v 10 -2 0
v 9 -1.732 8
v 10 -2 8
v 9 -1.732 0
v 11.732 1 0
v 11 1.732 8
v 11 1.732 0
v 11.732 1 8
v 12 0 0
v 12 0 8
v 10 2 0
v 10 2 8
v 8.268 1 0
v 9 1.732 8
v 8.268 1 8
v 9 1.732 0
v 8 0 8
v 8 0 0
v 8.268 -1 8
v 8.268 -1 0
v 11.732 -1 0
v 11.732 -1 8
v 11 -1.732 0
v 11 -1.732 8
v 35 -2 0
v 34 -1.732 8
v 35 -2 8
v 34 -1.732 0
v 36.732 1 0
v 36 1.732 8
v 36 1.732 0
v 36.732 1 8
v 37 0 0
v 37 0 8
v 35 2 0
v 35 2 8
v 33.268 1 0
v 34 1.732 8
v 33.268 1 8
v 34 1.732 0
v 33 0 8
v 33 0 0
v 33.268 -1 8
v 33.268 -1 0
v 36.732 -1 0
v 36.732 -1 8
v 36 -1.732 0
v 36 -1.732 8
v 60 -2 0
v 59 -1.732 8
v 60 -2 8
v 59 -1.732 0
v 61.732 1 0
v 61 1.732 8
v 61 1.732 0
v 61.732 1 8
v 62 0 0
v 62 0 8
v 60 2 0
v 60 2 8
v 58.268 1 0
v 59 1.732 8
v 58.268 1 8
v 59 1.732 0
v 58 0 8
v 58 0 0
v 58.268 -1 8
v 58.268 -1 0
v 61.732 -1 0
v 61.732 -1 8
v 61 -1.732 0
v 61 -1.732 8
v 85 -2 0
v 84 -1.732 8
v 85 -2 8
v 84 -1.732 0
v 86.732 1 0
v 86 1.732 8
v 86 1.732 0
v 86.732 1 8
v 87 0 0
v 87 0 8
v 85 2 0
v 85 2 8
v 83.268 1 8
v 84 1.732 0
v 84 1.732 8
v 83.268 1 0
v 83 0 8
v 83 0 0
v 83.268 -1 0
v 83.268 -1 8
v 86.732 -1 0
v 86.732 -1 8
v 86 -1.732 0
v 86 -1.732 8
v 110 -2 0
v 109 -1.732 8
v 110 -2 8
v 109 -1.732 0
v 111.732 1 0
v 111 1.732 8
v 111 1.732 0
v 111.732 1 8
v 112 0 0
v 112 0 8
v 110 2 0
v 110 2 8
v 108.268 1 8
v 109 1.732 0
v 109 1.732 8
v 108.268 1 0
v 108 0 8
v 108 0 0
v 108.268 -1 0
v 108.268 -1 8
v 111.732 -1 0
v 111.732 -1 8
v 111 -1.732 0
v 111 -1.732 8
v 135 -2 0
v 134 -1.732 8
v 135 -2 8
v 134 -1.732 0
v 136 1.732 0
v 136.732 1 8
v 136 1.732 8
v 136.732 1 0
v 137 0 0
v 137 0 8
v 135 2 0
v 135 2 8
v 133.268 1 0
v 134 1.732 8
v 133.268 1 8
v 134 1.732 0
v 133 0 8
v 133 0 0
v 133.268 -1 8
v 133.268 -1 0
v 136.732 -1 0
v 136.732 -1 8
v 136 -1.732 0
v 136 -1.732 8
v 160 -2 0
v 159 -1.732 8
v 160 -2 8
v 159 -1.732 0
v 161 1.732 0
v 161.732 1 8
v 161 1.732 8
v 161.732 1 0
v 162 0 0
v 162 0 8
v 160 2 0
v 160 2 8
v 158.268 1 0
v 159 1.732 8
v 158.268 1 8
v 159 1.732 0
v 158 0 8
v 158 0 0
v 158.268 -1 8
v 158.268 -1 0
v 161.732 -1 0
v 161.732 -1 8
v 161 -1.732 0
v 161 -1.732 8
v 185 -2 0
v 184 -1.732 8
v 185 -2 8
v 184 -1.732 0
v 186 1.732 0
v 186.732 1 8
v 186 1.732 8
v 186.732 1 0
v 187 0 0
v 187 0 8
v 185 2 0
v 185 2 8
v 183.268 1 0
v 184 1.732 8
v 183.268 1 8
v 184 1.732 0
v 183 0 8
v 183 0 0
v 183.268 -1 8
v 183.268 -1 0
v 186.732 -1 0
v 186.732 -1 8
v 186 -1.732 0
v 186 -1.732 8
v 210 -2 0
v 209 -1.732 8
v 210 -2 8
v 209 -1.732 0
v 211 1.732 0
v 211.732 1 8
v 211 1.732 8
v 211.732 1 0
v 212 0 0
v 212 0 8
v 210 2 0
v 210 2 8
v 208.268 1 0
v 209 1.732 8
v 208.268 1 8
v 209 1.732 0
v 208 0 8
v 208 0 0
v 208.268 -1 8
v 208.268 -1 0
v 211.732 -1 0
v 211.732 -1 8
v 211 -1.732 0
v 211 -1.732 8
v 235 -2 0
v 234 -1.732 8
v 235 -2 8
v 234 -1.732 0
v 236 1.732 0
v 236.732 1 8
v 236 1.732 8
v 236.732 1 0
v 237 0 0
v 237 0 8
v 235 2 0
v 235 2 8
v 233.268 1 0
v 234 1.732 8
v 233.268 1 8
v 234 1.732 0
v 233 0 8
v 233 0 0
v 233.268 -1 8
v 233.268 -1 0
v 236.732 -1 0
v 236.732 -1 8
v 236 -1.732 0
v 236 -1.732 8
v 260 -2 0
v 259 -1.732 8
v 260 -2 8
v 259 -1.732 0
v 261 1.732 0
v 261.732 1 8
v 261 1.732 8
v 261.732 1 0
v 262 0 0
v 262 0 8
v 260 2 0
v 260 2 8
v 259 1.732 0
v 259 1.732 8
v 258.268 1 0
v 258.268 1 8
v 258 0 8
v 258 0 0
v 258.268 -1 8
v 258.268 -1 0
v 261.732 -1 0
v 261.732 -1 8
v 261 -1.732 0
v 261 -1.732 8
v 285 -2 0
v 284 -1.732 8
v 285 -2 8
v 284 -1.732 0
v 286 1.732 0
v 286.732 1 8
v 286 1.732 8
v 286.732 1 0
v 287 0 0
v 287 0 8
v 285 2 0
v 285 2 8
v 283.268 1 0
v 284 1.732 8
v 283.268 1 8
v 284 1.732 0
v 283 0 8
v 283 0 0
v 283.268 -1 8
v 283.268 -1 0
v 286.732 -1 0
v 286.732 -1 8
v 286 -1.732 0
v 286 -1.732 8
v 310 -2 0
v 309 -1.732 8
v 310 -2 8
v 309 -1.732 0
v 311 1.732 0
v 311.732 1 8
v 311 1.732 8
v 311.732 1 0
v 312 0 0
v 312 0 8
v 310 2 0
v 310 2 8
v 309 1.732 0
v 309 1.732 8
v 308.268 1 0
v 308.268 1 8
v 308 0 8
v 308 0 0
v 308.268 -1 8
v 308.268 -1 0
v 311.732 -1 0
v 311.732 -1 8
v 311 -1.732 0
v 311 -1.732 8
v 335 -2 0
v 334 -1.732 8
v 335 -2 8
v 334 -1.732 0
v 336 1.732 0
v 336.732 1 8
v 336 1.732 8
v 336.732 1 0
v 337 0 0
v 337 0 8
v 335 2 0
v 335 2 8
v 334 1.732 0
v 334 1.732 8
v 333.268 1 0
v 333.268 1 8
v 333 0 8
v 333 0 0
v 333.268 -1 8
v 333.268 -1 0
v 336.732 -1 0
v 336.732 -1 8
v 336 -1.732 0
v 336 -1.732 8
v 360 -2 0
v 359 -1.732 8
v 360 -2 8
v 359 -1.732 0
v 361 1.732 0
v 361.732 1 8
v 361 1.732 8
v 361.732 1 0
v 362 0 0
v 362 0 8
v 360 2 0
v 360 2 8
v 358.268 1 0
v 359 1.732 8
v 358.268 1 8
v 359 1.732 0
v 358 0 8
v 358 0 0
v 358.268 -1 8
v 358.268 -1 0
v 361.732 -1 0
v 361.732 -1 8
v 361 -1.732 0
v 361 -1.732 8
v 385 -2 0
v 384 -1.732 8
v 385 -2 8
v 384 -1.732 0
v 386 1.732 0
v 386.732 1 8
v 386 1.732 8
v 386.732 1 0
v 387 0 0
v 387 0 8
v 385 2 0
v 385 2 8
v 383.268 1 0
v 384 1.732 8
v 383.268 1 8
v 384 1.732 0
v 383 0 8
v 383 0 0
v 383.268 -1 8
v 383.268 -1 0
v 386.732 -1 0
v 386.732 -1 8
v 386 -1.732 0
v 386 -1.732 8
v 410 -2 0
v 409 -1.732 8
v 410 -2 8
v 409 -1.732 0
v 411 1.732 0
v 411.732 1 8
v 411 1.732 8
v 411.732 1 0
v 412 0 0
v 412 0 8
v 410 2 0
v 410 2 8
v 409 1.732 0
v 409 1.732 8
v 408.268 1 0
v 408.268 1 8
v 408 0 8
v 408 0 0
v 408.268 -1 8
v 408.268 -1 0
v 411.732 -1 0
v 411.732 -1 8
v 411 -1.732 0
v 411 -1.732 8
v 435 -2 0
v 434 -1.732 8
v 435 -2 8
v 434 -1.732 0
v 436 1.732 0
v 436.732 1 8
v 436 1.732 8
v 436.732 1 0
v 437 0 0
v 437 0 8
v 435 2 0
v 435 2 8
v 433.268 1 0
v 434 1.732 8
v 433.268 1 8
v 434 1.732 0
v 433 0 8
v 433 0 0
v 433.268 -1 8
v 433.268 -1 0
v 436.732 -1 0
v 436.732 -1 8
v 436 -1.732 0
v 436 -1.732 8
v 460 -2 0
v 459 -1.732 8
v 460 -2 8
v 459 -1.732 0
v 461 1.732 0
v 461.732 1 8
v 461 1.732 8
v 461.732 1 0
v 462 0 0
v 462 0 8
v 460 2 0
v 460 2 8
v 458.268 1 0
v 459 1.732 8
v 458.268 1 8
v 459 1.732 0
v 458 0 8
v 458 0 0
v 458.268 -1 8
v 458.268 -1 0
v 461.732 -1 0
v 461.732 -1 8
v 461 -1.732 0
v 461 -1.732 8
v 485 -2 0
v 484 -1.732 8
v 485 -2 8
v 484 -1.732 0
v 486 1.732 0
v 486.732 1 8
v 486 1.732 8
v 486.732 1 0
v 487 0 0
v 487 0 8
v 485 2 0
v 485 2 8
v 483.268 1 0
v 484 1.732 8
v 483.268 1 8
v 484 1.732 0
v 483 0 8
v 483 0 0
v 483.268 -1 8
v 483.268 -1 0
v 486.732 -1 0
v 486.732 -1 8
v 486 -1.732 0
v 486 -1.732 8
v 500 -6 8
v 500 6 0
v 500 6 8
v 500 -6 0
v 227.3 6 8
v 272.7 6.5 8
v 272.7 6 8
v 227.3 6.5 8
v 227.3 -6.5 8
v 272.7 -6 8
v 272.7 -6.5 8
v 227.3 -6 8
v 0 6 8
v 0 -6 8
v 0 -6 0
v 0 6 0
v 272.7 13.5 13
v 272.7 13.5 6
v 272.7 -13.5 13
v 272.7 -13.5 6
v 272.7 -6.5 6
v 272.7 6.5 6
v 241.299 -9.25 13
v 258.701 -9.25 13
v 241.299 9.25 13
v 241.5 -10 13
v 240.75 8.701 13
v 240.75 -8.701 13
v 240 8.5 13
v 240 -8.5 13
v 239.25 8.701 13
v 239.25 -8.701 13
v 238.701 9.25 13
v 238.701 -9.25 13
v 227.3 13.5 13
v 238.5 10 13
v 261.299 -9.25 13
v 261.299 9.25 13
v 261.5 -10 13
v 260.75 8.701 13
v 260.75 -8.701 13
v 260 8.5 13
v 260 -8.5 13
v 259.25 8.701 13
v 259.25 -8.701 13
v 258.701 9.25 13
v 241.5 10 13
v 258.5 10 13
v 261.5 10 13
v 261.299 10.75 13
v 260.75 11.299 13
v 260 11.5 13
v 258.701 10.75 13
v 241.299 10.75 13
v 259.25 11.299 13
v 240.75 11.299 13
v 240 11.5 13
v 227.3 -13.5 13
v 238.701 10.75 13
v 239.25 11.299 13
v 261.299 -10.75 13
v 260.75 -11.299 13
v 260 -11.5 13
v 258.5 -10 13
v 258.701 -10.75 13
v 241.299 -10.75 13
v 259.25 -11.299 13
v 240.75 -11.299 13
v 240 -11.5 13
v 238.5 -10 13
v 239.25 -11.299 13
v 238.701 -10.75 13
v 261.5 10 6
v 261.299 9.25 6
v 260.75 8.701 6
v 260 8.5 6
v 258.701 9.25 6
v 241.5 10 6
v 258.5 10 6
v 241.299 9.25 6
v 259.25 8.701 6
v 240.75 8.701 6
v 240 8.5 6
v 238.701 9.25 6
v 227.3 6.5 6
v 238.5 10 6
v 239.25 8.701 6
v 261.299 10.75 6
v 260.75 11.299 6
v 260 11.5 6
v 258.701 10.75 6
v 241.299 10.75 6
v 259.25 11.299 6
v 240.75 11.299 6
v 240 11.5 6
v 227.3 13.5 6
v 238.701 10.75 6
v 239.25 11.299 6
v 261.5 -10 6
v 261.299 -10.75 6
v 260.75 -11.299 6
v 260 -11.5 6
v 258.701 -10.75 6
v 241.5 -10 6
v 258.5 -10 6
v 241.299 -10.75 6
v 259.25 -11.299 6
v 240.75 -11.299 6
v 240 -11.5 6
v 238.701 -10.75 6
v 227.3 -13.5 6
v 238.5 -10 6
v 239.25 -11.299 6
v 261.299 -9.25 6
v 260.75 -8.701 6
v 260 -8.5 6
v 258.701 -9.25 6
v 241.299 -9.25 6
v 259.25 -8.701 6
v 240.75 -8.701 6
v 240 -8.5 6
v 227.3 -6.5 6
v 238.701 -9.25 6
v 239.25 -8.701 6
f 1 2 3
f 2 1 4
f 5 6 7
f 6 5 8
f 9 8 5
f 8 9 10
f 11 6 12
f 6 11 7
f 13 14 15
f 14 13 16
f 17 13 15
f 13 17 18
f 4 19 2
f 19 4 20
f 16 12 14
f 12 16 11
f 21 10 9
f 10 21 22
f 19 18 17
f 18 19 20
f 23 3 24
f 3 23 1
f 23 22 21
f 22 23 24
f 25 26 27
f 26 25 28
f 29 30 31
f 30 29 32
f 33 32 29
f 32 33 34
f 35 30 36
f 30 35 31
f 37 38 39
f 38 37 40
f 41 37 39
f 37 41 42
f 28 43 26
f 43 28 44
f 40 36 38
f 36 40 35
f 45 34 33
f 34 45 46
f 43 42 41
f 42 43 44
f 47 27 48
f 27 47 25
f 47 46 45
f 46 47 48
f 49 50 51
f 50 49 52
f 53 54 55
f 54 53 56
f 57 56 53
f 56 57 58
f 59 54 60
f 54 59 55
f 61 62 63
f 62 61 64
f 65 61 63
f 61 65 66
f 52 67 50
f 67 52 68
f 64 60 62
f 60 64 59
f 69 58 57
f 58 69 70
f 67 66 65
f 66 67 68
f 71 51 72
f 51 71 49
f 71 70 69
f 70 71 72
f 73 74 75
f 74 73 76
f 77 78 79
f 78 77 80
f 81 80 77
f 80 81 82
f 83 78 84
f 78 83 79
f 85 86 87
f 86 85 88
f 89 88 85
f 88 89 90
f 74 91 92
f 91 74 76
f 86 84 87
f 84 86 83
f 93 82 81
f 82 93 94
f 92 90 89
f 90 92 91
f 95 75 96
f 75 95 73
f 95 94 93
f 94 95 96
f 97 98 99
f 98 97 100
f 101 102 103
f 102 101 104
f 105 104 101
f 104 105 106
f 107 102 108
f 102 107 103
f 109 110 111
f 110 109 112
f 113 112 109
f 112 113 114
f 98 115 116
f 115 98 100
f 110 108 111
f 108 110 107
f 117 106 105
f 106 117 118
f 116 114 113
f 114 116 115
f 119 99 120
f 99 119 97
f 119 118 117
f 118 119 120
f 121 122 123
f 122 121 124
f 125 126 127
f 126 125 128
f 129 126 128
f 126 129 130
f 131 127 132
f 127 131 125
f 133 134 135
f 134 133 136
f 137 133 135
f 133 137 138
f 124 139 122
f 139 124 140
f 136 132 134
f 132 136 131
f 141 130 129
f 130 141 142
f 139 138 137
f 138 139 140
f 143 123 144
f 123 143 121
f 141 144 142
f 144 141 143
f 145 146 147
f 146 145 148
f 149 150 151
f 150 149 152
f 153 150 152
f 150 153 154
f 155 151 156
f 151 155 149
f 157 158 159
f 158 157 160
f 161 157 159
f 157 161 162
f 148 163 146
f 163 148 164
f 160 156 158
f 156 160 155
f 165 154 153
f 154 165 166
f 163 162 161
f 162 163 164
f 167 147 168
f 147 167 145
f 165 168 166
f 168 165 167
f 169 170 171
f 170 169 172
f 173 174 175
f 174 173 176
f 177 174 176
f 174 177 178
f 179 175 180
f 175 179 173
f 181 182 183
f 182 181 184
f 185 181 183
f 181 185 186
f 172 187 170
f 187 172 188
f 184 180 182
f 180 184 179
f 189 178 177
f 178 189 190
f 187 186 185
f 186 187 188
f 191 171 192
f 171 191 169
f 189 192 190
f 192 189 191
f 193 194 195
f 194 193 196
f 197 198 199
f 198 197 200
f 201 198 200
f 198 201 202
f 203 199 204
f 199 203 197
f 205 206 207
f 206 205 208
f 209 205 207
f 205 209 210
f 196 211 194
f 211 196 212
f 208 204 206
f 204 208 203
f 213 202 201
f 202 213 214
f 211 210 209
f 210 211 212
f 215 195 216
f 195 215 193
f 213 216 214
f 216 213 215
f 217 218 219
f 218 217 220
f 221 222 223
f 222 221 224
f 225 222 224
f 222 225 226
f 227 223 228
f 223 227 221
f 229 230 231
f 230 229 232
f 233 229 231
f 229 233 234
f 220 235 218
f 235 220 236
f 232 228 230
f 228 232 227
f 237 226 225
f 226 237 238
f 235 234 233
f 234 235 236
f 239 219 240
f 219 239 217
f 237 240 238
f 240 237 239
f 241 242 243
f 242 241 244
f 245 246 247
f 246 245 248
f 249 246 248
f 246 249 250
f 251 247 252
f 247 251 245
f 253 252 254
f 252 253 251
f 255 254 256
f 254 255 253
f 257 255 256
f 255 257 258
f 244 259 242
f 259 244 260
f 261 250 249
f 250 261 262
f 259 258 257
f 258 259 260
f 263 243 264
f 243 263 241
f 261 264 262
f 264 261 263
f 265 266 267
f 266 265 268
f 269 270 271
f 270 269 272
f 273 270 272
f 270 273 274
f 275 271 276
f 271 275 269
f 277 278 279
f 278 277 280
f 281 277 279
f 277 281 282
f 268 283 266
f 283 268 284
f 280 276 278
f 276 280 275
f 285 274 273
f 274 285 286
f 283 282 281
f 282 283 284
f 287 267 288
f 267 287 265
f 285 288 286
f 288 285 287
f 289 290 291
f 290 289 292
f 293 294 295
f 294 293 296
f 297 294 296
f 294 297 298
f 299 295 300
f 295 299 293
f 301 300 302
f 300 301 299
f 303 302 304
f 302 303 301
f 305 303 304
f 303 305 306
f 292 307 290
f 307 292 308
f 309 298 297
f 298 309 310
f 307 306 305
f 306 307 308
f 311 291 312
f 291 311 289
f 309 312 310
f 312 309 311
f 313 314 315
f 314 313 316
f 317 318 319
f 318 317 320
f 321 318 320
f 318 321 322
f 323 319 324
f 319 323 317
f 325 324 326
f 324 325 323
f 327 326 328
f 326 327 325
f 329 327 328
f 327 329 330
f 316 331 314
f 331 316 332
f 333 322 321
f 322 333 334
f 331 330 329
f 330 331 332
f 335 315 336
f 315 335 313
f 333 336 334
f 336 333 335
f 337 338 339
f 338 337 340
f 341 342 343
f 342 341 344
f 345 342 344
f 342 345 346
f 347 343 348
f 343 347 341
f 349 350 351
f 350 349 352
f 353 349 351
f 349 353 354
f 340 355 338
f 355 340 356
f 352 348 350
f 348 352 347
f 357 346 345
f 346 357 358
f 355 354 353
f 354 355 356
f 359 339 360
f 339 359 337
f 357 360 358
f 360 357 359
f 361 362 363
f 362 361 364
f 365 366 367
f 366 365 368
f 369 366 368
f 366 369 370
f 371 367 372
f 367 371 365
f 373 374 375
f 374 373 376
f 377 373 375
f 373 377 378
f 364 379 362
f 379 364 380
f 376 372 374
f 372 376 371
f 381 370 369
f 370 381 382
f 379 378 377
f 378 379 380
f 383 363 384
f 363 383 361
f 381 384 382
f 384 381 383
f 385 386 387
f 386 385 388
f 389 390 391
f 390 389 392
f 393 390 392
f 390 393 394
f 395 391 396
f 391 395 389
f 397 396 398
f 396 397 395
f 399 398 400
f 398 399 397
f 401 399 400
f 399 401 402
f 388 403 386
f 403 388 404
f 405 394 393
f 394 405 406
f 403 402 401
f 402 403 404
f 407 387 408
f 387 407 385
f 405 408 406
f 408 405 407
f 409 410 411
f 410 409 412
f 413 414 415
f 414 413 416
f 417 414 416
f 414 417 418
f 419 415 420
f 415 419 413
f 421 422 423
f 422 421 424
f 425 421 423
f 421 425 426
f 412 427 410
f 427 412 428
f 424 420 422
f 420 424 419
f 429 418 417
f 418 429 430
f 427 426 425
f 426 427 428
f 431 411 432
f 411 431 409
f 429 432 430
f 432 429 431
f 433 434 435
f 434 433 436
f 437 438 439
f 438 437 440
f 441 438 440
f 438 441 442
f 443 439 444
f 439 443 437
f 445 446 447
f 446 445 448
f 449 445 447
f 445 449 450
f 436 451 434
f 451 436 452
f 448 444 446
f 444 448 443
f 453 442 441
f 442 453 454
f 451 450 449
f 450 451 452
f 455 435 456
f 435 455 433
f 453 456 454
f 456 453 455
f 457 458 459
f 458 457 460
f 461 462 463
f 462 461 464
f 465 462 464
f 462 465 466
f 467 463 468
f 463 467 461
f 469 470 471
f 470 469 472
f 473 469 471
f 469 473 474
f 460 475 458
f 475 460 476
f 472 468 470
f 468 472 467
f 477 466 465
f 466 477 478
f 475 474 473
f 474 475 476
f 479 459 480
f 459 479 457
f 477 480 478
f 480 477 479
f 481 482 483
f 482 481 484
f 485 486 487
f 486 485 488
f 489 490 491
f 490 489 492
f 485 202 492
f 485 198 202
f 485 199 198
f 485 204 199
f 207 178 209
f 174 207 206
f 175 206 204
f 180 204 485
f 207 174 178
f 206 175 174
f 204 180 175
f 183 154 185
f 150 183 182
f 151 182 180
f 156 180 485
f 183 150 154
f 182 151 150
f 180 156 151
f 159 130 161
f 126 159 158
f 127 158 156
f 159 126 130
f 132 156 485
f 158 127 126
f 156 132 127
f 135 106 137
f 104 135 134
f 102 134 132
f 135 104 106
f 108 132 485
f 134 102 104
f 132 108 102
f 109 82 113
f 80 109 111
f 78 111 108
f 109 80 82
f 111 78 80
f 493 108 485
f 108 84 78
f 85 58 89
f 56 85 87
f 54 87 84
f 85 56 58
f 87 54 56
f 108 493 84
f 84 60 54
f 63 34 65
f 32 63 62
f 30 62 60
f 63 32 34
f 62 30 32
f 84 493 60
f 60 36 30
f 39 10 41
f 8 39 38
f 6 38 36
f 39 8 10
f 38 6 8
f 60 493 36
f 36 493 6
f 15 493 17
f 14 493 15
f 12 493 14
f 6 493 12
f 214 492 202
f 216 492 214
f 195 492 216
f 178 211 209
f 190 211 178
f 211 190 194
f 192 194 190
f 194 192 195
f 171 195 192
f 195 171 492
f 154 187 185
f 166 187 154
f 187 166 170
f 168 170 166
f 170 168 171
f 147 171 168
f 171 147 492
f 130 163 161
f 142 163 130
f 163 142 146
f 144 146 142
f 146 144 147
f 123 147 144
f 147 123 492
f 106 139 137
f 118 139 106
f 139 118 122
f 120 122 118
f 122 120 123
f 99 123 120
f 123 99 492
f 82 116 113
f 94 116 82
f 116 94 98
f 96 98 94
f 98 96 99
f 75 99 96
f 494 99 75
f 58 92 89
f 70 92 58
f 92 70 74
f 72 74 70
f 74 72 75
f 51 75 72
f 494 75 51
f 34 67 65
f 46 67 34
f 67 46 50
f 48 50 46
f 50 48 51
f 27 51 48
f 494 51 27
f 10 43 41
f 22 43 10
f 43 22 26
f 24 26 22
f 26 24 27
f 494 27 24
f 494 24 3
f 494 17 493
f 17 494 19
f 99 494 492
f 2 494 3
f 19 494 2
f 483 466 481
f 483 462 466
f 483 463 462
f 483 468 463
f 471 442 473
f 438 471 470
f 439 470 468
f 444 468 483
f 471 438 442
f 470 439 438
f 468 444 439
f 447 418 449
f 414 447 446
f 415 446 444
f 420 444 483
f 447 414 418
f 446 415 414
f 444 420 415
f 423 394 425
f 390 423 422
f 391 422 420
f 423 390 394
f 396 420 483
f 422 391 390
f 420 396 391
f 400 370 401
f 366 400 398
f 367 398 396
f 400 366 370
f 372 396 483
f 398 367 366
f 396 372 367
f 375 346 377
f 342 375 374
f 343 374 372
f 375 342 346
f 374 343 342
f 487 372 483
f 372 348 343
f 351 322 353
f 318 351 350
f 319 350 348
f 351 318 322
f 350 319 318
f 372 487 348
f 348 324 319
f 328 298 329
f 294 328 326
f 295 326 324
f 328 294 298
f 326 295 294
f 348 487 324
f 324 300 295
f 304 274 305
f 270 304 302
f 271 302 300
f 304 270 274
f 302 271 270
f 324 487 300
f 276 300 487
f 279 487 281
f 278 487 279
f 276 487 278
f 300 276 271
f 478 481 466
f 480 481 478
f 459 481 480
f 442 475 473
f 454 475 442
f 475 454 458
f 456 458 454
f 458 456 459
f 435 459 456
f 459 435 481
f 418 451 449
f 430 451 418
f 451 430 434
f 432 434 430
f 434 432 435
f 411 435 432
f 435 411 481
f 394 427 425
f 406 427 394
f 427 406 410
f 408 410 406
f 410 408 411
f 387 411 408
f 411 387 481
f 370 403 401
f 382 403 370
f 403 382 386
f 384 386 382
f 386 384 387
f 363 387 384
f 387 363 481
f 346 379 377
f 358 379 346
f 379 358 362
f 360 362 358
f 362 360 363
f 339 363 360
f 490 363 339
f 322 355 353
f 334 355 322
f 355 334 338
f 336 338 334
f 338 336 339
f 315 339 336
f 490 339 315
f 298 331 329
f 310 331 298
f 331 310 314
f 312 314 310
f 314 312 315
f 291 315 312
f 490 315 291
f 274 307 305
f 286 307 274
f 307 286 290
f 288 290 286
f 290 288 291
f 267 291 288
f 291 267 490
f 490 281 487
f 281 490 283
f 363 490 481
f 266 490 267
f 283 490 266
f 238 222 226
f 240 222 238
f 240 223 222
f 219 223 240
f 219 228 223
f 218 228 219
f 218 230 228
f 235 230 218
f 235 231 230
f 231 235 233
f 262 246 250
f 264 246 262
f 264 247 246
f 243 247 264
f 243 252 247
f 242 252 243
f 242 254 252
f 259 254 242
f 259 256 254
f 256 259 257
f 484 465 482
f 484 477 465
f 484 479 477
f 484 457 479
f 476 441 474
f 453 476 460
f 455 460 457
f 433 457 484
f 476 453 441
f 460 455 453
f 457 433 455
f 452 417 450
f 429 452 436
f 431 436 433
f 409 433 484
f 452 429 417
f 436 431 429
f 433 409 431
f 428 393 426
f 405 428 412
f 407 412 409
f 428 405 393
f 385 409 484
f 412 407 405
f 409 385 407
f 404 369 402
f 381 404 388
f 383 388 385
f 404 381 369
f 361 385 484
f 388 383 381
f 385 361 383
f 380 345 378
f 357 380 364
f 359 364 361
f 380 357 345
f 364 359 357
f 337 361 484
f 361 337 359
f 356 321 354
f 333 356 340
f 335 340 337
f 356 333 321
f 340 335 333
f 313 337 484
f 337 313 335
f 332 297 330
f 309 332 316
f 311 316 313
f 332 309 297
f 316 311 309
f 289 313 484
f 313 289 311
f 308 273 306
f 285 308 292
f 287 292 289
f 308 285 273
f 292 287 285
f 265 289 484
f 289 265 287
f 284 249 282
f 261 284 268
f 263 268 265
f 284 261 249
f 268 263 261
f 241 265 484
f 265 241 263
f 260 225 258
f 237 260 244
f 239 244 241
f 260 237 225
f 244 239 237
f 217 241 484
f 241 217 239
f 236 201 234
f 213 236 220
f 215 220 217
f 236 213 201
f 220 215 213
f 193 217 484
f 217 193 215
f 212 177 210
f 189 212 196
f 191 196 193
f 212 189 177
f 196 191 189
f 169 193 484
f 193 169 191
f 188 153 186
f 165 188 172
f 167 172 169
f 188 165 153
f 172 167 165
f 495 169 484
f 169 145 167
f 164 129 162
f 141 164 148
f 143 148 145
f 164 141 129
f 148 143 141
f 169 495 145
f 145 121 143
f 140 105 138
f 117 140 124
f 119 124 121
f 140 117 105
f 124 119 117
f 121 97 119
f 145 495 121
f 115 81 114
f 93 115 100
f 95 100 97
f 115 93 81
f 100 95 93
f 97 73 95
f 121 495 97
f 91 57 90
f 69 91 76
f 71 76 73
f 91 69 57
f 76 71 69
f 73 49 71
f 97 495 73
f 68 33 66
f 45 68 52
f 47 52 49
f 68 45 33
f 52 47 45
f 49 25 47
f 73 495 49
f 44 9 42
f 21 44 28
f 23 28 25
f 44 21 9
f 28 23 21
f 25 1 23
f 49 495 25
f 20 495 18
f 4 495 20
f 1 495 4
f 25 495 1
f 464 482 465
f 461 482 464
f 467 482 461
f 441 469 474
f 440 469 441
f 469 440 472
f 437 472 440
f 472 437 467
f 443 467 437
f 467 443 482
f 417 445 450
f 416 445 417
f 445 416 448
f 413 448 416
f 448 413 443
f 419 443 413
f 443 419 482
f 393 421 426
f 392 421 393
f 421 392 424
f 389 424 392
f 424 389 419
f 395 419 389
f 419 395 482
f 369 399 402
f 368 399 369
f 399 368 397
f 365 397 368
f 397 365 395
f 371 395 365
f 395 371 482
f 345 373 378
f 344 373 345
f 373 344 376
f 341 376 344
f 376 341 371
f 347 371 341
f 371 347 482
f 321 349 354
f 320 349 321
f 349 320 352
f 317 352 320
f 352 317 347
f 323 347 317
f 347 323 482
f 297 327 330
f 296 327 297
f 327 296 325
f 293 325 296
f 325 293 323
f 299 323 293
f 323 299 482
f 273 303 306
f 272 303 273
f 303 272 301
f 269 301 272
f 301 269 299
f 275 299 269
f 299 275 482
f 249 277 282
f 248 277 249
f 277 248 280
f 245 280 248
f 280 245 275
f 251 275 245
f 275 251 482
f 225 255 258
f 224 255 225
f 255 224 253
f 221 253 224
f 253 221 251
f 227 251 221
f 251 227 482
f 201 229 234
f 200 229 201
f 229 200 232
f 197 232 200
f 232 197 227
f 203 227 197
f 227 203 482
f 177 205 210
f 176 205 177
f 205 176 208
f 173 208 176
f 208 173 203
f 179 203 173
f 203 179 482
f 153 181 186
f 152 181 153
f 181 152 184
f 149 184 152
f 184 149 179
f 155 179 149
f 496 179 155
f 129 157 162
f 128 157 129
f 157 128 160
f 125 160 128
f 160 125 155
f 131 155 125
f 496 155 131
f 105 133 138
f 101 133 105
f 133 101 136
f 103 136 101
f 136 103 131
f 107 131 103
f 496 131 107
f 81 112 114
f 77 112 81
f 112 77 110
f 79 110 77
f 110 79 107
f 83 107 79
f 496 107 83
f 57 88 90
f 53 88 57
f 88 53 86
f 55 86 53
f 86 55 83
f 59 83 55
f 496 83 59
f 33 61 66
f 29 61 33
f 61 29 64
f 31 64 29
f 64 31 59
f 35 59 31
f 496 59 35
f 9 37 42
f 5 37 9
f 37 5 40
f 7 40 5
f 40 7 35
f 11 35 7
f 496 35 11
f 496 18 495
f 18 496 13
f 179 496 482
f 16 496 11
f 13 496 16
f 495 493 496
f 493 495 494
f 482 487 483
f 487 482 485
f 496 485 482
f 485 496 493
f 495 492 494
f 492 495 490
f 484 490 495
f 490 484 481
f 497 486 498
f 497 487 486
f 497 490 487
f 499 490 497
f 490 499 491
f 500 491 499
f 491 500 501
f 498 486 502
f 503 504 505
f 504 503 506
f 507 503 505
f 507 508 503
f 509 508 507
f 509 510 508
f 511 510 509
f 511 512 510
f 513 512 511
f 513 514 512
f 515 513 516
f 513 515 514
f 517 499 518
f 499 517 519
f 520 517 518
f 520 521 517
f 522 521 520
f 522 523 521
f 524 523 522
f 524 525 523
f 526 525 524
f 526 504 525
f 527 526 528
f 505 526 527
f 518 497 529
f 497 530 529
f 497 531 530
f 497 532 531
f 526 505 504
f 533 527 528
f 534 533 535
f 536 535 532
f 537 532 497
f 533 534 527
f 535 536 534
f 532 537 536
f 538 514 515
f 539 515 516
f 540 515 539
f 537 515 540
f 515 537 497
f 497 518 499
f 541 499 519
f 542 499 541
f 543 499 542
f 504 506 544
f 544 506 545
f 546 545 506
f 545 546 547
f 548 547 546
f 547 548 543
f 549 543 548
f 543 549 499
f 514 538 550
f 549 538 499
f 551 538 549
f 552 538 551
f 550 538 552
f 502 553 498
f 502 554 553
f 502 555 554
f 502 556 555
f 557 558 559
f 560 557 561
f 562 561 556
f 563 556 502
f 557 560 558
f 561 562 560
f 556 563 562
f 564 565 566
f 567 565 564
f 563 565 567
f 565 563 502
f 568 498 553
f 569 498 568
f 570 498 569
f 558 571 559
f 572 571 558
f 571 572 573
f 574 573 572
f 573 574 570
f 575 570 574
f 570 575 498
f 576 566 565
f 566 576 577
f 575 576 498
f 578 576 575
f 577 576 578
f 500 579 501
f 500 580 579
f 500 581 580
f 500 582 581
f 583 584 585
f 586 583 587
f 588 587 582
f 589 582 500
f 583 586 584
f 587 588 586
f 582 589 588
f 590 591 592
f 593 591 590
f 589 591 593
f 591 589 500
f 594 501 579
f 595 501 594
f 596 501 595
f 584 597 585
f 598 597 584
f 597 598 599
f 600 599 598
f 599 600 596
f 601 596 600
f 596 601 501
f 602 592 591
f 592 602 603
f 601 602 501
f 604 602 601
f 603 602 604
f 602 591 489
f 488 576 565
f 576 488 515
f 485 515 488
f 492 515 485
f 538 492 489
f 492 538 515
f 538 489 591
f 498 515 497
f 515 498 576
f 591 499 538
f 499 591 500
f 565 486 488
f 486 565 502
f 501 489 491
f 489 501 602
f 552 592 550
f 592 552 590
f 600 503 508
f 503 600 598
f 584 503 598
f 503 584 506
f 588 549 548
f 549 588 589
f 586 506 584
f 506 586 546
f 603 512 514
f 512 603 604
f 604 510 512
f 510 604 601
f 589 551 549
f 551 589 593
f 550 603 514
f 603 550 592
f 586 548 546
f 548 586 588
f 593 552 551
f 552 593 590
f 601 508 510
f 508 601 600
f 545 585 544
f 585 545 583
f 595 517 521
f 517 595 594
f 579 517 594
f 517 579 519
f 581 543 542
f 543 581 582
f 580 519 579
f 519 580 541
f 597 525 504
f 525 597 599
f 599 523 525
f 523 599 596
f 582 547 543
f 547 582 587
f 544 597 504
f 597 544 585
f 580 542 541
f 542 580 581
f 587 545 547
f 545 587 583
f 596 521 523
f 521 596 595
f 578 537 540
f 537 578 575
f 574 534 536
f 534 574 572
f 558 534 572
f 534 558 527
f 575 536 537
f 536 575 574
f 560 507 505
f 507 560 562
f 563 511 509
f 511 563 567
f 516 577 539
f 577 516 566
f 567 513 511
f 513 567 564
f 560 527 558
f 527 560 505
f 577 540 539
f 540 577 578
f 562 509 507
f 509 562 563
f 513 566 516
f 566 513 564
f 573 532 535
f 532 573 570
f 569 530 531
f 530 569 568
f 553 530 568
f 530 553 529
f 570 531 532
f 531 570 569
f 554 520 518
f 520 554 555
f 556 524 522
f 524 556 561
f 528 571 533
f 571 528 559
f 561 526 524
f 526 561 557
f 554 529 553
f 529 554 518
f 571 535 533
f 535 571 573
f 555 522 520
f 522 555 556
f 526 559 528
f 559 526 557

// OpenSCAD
module mgn12h
(
    length,
    cart_position = 0 
){

    rail(length);
    translate([cart_position,0,0])
    cart();
}

module rail(length){
    
    difference(){
        translate([0,-6])
        cube([length,12,8]);
        
        
        for( d = [10:25:length]){
            translate([d,0,0])
            cylinder(d=4, h= 30, center= true, $fn= 12);
        }
    }
}

module cart(){
    
    translate([-45.4 / 2,0,0])
    difference(){
        translate([0,-27/2,6])
        cube([45.4,27,7]);
        
        translate([0,-13/2,6])
        cube([45.4,13,2]);
        
        // m3 mounts
        translate([45.4 / 2 - 10,-10,10])
        cylinder(d= 3, $fn=12, h = 20, center= true);
        
        translate([45.4 / 2 + 10,-10,10])
        cylinder(d= 3, $fn=12, h = 20, center= true);
        
        translate([45.4 / 2 - 10,+10,10])
        cylinder(d= 3, $fn=12, h = 20, center= true);
        
        translate([45.4 / 2 + 10,+10,10])
        cylinder(d= 3, $fn=12, h = 20, center= true);
    }

}

mgn12h(500, 250);
